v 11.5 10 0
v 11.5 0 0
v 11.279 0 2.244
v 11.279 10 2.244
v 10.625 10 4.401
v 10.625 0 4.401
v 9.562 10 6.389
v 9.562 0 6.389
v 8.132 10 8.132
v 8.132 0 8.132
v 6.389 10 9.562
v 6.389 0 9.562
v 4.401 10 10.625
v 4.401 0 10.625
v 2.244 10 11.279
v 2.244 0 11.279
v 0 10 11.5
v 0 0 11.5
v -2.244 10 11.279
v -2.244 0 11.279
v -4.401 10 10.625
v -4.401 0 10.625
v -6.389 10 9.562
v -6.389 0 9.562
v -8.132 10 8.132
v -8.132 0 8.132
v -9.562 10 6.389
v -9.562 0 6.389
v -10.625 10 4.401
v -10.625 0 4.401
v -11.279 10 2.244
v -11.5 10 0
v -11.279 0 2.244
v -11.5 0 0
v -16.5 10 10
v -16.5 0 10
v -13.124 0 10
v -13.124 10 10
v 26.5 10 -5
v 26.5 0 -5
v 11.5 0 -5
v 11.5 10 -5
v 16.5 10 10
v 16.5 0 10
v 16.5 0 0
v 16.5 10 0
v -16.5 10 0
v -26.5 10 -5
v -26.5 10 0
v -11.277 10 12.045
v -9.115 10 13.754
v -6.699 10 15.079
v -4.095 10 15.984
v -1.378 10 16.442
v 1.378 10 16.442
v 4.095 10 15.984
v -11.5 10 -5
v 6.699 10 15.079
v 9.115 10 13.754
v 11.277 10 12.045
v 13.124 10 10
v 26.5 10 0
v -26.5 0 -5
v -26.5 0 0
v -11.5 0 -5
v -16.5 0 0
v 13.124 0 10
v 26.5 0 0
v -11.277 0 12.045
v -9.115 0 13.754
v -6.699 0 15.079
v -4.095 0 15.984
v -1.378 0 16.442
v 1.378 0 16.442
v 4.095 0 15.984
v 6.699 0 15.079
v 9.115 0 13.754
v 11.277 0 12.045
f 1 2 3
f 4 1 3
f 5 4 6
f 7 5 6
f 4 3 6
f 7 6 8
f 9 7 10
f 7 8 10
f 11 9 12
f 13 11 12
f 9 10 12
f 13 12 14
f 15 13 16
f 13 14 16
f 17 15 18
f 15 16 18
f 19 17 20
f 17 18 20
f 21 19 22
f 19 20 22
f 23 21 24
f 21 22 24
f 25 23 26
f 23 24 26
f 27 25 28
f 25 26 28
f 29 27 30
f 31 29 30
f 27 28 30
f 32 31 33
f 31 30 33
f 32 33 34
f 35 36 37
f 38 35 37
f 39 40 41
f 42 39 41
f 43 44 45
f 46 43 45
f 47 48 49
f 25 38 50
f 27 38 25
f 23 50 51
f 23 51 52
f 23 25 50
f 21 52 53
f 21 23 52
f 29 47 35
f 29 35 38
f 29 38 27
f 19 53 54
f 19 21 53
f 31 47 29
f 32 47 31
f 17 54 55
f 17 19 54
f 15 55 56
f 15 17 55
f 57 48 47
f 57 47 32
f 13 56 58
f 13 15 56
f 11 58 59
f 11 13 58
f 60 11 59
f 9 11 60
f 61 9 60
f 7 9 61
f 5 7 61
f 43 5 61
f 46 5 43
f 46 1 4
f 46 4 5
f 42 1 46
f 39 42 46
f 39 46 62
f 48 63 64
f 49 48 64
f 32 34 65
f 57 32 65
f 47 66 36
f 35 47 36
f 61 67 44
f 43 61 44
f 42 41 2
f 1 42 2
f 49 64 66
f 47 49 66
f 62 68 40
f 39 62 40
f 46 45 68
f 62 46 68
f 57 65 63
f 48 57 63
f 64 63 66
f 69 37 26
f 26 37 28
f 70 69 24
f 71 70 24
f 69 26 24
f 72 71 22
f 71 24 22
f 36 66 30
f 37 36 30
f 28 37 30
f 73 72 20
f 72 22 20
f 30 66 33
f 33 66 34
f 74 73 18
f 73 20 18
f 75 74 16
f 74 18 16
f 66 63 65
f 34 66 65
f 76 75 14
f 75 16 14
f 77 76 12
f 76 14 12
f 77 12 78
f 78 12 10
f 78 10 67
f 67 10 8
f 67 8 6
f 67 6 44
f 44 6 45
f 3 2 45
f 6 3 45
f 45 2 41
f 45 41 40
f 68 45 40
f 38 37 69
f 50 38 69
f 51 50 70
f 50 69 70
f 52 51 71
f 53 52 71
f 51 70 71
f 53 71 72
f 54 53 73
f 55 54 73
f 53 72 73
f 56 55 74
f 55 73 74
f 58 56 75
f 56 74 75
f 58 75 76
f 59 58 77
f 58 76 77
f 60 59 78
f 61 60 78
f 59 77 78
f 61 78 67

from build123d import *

# Parameters (mm, degrees)
EXTRUDE_1_DEPTH = 10


with BuildPart() as part:
    # Эскиз1 → Бобышка-Вытянуть1 (new body)
    with BuildSketch(Plane(origin=(0, 0, 0), x_dir=(1, 0, 0), z_dir=(0, 1, 0))):
        with BuildLine():
            Line((-16.5, 0), (-16.5, -10))
            Line((-16.5, -10), (-13.124404748, -10))
            ThreePointArc((-13.124404748, -10), (0, -16.5), (13.124404748, -10))
            Line((13.124404748, -10), (16.5, -10))
            Line((16.5, -10), (16.5, 0))
            Line((16.5, 0), (26.5, 0))
            Line((26.5, 0), (26.5, 5))
            Line((26.5, 5), (11.5, 5))
            Line((11.5, 5), (11.5, 0))
            ThreePointArc((11.5, 0), (0, -11.5), (-11.5, 0))
            Line((-11.5, 0), (-11.5, 5))
            Line((-11.5, 5), (-26.5, 5))
            Line((-26.5, 5), (-26.5, 0))
            Line((-26.5, 0), (-16.5, 0))
        make_face()
    extrude(amount=EXTRUDE_1_DEPTH)


solid = part.part
